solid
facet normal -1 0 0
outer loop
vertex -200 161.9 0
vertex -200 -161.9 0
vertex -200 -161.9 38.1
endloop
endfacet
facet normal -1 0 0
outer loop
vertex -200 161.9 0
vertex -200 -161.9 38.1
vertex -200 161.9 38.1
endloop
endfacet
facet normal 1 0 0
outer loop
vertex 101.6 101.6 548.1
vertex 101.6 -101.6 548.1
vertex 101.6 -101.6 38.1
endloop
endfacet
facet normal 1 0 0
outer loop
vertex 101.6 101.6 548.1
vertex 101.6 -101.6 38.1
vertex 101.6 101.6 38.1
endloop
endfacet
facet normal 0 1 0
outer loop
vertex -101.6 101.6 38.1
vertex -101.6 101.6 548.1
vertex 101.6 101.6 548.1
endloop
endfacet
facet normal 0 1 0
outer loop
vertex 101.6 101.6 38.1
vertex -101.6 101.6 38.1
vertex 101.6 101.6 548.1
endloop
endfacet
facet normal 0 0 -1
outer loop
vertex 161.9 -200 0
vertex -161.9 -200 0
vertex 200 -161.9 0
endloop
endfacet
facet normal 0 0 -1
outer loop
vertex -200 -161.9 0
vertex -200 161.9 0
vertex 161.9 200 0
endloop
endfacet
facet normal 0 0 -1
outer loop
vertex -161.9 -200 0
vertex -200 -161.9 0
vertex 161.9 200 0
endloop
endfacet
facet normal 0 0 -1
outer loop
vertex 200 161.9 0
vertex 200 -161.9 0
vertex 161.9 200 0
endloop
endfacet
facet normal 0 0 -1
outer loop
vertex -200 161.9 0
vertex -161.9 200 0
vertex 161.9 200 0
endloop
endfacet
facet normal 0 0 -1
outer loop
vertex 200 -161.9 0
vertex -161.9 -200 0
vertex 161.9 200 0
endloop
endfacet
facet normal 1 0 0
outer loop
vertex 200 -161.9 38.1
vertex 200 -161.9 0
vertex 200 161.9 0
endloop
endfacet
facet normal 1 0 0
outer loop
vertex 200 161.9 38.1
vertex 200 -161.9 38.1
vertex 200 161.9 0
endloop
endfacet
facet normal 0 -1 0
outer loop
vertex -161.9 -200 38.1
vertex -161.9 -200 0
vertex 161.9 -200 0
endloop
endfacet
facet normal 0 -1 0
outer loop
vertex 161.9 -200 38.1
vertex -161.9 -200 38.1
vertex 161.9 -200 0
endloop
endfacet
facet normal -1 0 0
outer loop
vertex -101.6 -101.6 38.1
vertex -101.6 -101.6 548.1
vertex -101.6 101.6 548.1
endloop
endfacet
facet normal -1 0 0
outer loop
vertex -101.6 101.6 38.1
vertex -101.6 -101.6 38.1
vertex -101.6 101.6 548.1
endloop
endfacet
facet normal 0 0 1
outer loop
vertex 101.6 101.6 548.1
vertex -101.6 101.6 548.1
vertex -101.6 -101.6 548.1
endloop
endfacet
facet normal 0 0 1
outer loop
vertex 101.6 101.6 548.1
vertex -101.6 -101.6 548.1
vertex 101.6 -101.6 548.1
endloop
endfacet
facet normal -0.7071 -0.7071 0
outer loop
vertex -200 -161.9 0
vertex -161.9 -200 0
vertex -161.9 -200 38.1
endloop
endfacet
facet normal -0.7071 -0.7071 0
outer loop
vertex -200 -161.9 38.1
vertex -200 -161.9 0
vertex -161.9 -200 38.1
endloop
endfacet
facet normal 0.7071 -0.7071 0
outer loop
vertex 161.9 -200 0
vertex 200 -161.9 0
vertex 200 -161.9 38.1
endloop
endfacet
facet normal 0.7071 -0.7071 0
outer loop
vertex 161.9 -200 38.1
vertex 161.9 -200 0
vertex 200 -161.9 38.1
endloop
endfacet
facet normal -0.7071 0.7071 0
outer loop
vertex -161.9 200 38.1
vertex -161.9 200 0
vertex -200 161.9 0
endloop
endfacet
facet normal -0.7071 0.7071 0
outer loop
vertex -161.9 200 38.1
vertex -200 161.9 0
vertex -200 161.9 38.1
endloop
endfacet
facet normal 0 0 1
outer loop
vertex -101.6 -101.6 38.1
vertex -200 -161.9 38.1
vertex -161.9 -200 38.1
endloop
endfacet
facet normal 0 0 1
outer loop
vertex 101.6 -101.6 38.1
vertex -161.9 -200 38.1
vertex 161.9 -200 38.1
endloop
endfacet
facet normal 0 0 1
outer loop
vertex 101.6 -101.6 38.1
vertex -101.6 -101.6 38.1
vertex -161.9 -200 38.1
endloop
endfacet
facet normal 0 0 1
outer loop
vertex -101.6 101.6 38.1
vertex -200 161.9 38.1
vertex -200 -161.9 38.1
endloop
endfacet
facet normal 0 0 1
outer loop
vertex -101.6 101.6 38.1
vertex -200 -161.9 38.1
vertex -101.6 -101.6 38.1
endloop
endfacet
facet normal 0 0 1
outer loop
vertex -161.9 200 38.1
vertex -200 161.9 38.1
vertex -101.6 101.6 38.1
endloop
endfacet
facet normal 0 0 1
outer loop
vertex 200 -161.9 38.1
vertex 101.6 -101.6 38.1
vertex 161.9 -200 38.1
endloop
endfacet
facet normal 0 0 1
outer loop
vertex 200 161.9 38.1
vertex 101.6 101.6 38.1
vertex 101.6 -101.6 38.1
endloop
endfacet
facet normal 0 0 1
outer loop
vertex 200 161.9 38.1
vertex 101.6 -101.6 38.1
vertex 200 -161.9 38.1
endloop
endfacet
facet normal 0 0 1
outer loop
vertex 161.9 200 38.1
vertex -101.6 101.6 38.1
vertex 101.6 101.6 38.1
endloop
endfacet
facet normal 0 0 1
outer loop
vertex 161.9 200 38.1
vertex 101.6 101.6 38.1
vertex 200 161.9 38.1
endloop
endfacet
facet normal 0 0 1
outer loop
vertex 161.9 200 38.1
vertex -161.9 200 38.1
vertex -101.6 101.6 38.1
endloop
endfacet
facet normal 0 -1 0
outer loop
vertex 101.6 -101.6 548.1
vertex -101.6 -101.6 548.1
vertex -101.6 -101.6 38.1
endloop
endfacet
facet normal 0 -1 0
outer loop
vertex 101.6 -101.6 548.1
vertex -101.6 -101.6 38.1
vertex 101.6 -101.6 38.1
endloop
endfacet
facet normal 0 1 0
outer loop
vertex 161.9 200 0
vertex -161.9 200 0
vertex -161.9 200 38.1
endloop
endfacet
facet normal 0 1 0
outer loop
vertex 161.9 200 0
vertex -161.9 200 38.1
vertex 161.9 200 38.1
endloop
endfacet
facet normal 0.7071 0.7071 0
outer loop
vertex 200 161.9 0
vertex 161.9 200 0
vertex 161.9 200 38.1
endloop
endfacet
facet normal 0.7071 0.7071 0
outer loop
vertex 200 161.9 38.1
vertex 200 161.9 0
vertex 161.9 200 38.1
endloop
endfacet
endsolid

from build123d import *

# Parameters (mm, degrees)
F0_W     = 400
F0_H     = 400
F1_DEPTH = 38.1
F2_SIZE  = 38.1
F3_W     = 203.2
F3_H     = 203.2
F4_DEPTH = 510


with BuildPart() as f1:
    # F0 (on Top) → F1 (new body)
    with BuildSketch(Plane.XY):
        Rectangle(F0_W, F0_H)
    extrude(amount=F1_DEPTH)

    # F2
    f2_edges = [f1.edges().sort_by_distance(p)[0] for p in [
        (-200, 200, 19.05),
        (-200, -200, 19.05),
        (200, -200, 19.05),
        (200, 200, 19.05),
    ]]
    chamfer(f2_edges, length=F2_SIZE)

    # F3 (on face) → F4 (join)
    with BuildSketch(Plane.XY.offset(38.1)):
        Rectangle(F3_W, F3_H)
    extrude(amount=F4_DEPTH)


solid = f1.part
